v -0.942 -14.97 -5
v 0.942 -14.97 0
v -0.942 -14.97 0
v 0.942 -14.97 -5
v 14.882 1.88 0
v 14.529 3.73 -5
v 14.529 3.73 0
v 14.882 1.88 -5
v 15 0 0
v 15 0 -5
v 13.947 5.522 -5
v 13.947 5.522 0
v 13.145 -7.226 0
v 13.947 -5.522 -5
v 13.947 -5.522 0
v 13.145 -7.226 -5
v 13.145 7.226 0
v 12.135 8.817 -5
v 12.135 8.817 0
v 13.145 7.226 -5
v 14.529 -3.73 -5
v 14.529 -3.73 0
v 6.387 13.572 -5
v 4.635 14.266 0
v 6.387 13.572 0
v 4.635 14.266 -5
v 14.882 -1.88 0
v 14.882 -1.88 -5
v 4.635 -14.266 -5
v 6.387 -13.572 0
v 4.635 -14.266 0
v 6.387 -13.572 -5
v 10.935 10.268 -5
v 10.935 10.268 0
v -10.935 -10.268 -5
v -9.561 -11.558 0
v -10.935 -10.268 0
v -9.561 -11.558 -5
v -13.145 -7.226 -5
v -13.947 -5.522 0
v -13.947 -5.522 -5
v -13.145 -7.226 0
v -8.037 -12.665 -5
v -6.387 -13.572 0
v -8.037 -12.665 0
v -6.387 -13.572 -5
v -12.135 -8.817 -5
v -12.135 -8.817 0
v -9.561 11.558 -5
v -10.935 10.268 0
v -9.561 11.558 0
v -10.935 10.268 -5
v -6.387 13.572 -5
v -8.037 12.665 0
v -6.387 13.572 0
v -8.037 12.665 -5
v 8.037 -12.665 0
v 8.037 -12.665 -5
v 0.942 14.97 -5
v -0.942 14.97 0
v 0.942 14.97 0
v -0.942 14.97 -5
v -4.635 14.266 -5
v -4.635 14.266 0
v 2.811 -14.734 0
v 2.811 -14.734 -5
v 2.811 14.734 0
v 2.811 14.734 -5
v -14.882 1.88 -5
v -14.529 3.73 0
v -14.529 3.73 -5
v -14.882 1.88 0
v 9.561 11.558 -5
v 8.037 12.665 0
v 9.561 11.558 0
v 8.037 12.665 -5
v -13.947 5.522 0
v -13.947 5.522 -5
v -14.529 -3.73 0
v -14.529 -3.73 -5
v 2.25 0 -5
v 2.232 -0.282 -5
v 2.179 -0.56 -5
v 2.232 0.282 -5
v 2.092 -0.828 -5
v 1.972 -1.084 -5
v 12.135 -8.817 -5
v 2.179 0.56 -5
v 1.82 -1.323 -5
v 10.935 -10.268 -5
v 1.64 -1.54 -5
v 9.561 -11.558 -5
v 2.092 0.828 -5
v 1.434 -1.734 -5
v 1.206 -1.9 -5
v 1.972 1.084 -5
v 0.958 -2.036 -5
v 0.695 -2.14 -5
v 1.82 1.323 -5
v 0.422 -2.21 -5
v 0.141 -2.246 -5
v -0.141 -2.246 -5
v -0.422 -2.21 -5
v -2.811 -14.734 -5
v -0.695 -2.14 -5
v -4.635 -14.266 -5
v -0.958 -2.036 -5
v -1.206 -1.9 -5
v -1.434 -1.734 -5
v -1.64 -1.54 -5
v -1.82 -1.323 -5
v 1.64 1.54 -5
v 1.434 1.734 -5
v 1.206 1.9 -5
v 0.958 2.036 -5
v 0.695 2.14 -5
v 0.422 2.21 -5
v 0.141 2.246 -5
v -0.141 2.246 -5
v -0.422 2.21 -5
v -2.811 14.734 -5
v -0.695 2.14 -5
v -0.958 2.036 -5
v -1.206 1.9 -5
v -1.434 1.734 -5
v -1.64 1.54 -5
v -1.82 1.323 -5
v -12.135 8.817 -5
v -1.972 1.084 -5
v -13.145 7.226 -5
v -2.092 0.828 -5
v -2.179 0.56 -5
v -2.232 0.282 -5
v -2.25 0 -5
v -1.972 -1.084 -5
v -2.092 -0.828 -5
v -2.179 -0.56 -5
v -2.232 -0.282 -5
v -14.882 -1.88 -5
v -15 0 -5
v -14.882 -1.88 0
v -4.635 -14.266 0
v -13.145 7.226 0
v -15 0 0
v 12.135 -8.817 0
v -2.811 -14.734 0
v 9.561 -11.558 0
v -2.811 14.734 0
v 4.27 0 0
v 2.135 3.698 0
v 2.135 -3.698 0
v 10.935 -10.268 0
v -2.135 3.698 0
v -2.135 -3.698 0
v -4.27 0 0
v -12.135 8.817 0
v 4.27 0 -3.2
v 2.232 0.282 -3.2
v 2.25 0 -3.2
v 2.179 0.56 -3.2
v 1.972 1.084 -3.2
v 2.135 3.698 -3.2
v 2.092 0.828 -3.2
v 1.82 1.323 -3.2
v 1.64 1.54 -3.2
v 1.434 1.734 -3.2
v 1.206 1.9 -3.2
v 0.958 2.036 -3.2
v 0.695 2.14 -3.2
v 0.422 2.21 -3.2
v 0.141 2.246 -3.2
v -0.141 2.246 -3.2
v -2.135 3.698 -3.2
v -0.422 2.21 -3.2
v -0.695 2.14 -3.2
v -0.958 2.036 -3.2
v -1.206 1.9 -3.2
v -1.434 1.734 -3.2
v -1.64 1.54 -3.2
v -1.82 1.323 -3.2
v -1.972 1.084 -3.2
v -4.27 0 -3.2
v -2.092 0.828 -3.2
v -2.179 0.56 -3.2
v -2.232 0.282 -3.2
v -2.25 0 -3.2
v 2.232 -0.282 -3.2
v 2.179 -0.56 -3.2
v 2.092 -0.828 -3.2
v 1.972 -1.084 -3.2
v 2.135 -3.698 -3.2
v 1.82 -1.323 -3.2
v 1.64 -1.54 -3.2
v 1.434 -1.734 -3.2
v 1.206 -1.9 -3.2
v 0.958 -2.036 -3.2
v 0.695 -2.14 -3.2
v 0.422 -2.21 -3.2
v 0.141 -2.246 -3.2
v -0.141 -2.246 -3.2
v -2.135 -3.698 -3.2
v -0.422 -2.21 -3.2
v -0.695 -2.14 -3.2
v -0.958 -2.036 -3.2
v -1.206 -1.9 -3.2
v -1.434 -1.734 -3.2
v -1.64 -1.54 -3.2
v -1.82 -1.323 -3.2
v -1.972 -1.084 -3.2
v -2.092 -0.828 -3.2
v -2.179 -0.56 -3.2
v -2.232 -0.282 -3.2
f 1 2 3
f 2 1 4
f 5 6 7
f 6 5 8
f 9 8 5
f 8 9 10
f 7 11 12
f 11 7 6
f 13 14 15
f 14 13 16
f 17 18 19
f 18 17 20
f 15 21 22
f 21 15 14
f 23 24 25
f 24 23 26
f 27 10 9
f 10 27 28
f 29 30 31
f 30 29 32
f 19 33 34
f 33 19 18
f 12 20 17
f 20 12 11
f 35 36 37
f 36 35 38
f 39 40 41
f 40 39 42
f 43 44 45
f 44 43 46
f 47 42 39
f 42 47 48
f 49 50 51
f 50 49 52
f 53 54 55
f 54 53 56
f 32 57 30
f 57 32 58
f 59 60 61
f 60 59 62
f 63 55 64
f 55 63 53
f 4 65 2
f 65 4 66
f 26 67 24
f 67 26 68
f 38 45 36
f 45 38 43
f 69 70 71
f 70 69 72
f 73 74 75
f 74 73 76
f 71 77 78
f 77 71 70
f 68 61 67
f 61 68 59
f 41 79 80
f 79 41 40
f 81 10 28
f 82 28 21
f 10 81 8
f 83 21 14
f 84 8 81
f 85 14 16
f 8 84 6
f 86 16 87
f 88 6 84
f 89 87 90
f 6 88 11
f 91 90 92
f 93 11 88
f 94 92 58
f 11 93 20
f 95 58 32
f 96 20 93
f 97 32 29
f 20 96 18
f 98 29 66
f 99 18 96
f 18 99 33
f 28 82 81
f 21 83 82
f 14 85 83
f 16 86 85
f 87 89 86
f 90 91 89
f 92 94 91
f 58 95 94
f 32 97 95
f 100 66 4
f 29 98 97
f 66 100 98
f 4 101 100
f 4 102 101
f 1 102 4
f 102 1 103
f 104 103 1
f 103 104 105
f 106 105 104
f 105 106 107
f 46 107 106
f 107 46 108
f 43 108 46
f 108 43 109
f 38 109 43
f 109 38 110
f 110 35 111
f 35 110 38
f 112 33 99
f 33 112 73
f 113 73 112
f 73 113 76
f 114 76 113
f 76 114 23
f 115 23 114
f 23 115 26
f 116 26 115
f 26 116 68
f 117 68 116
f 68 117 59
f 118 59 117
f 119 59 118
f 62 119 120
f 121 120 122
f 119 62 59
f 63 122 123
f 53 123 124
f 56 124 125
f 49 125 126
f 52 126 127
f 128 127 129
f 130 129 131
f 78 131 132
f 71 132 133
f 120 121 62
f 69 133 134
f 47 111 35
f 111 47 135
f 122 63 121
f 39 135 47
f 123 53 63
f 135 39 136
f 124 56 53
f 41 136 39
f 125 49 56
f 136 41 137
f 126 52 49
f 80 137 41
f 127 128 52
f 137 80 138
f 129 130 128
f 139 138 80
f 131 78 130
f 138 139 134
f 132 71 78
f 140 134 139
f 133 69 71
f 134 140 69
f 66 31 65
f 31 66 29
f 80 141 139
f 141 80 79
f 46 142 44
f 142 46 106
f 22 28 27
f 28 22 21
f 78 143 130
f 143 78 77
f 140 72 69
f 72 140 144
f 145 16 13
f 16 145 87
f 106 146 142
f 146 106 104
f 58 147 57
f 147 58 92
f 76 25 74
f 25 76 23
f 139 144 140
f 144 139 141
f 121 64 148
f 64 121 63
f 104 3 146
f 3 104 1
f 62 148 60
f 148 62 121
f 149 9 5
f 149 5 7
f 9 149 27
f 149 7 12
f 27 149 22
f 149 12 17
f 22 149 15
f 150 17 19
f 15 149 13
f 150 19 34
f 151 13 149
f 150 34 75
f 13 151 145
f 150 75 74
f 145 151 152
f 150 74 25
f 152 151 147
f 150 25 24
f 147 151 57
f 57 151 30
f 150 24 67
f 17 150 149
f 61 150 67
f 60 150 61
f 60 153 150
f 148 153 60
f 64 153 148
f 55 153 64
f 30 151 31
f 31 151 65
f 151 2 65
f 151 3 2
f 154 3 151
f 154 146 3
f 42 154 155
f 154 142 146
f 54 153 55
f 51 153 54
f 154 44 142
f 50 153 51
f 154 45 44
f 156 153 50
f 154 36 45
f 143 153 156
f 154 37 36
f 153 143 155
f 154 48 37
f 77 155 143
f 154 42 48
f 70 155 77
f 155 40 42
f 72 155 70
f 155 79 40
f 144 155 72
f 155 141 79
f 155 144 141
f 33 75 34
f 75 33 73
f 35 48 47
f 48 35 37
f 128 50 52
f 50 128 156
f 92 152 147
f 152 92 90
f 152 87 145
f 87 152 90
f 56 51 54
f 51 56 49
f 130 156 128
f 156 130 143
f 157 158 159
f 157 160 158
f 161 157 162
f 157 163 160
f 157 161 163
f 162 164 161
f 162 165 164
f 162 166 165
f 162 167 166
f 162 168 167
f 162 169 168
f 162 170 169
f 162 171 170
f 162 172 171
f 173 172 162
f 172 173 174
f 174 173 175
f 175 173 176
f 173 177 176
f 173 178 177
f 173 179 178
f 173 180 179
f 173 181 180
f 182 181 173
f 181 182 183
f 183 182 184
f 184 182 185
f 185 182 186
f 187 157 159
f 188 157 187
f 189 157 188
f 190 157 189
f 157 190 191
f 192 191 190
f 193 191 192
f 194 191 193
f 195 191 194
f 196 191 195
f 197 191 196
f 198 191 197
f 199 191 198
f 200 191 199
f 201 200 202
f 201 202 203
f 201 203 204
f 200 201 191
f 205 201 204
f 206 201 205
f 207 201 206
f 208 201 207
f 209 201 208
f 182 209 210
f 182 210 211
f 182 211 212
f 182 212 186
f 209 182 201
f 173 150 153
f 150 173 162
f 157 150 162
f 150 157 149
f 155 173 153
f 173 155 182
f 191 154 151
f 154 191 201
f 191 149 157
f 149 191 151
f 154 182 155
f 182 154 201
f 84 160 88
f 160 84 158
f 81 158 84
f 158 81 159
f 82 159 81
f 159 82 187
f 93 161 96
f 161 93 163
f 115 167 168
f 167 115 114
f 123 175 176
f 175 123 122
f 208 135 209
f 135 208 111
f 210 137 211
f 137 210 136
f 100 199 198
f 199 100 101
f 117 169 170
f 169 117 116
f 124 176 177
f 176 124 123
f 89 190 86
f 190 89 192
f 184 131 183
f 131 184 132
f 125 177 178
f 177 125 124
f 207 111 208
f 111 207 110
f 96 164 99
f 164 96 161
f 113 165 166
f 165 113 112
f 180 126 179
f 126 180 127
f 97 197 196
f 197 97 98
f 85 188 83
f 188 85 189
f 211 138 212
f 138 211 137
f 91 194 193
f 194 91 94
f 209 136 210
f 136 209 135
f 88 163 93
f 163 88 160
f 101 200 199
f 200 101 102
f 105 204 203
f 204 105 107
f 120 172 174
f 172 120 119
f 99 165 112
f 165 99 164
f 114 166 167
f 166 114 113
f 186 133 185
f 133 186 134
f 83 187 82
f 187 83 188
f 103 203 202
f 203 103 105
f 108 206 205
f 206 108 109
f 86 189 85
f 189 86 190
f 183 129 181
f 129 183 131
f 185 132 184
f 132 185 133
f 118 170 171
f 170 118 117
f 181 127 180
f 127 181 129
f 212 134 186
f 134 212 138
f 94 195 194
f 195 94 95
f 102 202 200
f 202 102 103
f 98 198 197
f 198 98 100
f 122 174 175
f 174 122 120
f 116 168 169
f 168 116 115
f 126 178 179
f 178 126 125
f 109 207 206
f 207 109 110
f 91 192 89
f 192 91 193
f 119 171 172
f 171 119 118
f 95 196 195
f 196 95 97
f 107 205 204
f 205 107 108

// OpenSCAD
$fn = 50;


difference() {
	union() {
		translate(v = [0, 0, -5.0000000000]) {
			cylinder(h = 5.0000000000, r = 15.0000000000);
		}
		translate(v = [0, 0, -3.5000000000]) {
			cylinder(h = 3.5000000000, r = 2.8750000000);
		}
	}
	union() {
		translate(v = [0, 0, 0]) {
			rotate(a = [0, 0, 0]) {
				difference() {
					union() {
						translate(v = [0, 0, -3.2000000000]) {
							linear_extrude(height = 3.2000000000) {
								polygon(points = [[4.2698000000, 0.0000000000], [2.1349000000, 3.6977552691], [-2.1349000000, 3.6977552691], [-4.2698000000, 0.0000000000], [-2.1349000000, -3.6977552691], [2.1349000000, -3.6977552691]]);
							}
						}
					}
					union();
				}
			}
		}
		#translate(v = [0, 0, -100.0000000000]) {
			cylinder(h = 200, r = 2.2500000000);
		}
	}
}
